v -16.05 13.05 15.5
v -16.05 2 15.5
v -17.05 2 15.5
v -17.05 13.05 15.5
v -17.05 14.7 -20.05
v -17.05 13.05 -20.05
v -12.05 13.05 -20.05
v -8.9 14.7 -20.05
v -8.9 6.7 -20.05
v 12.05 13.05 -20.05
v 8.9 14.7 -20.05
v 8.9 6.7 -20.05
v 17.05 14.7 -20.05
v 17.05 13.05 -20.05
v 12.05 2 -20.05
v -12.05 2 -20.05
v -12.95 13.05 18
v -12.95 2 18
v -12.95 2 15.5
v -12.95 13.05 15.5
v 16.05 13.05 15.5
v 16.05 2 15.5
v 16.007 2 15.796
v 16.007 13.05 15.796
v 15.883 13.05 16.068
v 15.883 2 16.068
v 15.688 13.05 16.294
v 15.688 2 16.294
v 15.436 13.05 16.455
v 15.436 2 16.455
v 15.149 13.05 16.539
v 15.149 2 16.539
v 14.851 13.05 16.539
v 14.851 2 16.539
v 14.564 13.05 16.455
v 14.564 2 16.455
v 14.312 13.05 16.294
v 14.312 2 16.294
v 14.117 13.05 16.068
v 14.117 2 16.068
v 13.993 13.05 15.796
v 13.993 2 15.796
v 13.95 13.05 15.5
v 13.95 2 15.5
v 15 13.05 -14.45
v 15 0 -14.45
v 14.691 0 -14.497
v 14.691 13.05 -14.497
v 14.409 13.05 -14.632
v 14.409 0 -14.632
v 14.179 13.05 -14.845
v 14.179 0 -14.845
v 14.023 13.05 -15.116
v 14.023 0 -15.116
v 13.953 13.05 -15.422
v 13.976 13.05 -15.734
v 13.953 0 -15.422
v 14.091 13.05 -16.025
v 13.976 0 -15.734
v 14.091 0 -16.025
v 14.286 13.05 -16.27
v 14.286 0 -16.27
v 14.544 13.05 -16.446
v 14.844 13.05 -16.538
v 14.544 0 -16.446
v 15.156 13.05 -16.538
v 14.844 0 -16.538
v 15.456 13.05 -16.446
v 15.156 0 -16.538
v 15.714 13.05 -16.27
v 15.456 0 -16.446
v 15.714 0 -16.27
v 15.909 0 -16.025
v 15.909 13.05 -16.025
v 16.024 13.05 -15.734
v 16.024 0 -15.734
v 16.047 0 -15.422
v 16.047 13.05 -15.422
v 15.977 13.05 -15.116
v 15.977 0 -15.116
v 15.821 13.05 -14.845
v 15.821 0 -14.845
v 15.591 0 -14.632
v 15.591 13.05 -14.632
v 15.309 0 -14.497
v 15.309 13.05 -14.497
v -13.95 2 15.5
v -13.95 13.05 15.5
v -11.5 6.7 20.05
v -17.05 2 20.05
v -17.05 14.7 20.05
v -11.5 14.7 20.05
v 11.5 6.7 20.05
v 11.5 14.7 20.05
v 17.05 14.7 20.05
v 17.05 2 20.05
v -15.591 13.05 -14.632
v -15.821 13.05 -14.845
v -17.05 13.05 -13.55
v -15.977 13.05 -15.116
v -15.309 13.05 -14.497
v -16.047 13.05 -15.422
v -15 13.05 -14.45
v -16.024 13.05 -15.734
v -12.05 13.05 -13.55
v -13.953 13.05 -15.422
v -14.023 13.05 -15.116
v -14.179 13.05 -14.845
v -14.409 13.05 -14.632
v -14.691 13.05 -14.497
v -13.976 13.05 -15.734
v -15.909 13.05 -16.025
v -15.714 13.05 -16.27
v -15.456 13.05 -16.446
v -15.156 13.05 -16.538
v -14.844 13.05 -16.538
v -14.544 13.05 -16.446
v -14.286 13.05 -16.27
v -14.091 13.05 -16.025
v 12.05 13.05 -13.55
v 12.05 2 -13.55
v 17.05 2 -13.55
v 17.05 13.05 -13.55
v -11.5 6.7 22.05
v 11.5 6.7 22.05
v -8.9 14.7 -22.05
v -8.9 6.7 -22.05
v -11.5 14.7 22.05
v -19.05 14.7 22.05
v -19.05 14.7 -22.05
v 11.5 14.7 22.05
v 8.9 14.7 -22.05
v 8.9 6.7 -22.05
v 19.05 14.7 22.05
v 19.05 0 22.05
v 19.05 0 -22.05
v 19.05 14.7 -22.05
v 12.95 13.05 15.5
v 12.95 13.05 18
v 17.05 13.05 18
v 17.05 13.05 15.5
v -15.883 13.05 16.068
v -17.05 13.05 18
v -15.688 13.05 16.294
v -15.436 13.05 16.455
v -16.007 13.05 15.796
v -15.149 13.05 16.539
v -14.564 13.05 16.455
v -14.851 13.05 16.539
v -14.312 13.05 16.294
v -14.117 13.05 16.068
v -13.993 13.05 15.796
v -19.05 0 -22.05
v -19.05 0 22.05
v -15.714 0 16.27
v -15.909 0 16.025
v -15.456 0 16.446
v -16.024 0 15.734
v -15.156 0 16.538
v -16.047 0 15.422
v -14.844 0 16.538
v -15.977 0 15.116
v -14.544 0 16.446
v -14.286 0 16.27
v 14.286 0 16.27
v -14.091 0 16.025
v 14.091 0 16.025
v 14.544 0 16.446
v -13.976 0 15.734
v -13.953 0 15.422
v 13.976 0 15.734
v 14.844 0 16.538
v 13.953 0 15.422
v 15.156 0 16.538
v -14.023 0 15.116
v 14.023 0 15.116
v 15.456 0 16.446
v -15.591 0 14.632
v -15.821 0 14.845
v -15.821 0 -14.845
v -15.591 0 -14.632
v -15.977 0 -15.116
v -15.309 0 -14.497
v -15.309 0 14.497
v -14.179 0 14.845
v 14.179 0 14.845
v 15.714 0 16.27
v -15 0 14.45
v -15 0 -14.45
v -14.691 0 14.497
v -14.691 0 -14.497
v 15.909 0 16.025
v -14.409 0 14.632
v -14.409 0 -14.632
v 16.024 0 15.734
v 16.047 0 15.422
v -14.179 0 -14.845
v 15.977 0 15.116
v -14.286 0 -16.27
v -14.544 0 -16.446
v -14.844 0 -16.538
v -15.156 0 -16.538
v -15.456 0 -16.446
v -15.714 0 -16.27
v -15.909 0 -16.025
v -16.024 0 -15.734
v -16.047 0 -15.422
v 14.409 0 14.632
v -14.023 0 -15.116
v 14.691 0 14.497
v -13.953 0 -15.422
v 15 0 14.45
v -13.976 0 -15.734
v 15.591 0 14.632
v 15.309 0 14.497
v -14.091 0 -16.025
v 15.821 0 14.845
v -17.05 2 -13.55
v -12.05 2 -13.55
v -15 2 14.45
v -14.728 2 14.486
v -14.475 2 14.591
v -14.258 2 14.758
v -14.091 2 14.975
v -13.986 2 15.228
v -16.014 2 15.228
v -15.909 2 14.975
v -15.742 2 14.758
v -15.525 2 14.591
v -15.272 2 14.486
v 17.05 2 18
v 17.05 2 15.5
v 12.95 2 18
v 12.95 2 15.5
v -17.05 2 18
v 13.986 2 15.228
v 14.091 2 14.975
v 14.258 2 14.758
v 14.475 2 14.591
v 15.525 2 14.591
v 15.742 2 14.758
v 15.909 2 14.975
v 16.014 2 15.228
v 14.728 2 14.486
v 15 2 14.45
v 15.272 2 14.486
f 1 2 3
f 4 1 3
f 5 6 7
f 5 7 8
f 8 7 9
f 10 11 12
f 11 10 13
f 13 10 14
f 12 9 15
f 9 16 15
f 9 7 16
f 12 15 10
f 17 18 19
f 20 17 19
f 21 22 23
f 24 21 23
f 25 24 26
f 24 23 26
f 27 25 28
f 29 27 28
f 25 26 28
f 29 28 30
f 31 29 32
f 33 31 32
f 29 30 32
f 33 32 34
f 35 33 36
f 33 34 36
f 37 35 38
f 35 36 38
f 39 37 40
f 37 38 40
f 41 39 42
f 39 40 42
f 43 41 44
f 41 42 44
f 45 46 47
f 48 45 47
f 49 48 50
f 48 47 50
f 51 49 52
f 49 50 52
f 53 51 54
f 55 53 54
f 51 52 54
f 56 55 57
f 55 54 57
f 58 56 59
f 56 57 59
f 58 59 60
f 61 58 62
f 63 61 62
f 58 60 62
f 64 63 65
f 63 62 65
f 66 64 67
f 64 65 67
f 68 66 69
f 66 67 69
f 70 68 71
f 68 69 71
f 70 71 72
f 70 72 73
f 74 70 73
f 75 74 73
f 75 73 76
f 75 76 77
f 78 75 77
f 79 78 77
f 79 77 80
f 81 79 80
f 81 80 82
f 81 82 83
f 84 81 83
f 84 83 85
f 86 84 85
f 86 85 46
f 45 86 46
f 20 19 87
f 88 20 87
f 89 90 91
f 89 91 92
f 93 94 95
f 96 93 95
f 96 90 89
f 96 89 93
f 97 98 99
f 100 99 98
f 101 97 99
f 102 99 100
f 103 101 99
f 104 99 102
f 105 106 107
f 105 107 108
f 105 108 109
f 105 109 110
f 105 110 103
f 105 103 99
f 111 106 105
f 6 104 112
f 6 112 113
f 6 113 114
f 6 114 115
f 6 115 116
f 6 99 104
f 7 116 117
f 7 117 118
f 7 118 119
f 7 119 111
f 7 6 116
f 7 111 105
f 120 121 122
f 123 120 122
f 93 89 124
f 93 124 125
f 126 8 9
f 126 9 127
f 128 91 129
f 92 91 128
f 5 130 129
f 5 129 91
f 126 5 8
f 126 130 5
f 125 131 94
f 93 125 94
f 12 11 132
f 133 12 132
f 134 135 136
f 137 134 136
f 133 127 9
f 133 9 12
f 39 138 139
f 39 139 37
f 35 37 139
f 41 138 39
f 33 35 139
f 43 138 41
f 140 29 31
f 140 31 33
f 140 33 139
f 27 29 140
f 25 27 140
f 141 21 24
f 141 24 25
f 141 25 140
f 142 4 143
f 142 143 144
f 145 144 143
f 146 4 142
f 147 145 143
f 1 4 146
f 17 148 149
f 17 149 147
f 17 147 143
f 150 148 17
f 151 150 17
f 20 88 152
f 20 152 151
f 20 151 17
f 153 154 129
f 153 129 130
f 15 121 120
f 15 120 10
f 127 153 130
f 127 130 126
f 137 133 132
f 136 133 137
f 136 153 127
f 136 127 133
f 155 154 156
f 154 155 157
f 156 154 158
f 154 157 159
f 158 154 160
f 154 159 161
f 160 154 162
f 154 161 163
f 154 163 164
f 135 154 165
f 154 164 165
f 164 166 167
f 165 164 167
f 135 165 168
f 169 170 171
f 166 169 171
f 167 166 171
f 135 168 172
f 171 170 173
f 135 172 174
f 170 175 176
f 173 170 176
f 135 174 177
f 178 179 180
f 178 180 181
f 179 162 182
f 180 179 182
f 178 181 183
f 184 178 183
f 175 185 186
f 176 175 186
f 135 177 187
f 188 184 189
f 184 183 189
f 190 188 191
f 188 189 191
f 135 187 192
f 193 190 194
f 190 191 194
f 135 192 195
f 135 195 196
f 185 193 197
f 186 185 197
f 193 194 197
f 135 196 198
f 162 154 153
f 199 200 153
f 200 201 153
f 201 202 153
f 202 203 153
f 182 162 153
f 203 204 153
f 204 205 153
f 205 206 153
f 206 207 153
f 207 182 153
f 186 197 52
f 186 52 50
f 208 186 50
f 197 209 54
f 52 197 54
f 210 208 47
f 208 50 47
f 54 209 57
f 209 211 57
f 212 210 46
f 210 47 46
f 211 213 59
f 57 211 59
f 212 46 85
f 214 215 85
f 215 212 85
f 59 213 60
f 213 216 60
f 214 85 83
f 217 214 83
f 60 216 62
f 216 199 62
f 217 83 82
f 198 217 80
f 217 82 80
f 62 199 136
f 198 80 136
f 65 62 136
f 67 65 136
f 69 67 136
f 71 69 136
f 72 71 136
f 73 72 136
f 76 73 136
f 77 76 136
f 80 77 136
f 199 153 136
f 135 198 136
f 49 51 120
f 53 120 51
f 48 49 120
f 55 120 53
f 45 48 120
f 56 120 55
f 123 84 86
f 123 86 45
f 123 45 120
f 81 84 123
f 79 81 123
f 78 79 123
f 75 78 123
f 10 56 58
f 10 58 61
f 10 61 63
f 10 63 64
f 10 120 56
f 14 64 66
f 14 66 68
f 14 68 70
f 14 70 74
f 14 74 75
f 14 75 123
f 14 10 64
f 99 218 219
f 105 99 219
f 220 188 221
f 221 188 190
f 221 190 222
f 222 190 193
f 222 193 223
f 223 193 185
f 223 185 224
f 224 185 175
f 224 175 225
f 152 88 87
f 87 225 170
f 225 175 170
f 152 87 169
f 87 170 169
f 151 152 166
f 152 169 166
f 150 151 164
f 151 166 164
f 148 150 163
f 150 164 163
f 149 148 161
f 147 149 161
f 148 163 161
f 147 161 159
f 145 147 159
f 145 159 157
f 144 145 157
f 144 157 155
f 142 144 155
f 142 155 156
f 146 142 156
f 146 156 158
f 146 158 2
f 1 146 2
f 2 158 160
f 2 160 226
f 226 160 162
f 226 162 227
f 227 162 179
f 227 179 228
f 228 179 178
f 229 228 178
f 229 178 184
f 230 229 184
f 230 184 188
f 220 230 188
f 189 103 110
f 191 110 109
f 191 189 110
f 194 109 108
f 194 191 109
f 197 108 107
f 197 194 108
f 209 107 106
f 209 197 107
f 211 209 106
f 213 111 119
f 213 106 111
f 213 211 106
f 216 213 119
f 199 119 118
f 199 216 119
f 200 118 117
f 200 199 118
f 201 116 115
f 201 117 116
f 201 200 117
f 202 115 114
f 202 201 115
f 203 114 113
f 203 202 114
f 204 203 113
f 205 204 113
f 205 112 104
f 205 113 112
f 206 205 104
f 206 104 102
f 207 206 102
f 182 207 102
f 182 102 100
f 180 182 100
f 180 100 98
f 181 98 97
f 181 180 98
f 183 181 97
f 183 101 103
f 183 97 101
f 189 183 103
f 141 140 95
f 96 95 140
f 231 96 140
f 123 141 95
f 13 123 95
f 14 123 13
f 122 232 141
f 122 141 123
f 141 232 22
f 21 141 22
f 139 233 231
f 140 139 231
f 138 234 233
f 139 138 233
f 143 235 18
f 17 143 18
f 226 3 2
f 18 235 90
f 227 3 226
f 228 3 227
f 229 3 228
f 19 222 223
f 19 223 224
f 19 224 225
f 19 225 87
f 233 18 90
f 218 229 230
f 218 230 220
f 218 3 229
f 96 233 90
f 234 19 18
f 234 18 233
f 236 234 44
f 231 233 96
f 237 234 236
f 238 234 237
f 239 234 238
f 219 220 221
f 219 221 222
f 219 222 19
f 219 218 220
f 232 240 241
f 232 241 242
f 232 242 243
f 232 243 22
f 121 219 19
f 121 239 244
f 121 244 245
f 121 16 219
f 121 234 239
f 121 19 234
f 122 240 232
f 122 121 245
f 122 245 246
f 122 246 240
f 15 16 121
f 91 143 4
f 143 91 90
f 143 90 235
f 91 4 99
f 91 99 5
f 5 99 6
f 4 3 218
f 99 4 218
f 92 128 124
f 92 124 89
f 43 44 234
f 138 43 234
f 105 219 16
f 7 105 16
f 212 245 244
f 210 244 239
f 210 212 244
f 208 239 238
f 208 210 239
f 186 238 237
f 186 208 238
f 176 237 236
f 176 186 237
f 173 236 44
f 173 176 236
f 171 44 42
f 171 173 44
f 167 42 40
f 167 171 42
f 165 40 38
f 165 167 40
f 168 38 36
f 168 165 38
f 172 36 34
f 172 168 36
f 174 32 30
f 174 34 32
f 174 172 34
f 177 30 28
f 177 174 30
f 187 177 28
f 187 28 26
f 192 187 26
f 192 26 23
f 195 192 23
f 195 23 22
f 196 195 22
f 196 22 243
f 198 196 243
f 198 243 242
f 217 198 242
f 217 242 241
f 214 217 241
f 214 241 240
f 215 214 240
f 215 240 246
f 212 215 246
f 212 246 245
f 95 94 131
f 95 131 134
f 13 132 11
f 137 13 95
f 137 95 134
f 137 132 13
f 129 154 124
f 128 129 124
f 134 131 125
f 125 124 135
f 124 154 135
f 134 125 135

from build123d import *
from build123d.topology import SkipClean

# Parameters (mm, degrees)
BOSS_EXTRUDE1_DEPTH                        = 2
BOSS_EXTRUDE2_DEPTH                        = 12.7
BOSS_EXTRUDE2_DEPTH_BACK                   = 2
SKETCH2_W                                  = 38.1
SKETCH2_H                                  = 44.1
SKETCH2_W_2                                = 34.1
SKETCH2_H_2                                = 40.1
SKETCH4_W                                  = 17.8
SKETCH4_H                                  = 2
SKETCH4_W_2                                = 23
CUT_EXTRUDE1_DEPTH                         = 8
SKETCH5_W                                  = 5
SKETCH5_H                                  = 6.5
BOSS_EXTRUDE3_DEPTH                        = 11.05
SKETCH3_R                                  = 1.05
CUT_EXTRUDE2_DEPTH                         = 33.637325258
MIRROR1_AT_THE_SECOND_PLANE_COPY_1_SKETC_R = 1.05
MIRROR1_AT_THE_SECOND_PLANE_COPY_1_DEPTH   = 33.637325258


with BuildPart() as part:
    # Sketch1 → Boss-Extrude1 (new body)
    with BuildSketch(Plane(origin=(0, 0, 0), x_dir=(1, 0, 0), z_dir=(0, 1, 0))):
        Polygon((-17.05, 20.05), (-17.05, -20.05), (17.05, -20.05), align=None)
        Polygon((17.05, 20.05), (17.05, -20.05), (-17.05, 20.05), align=None)
    extrude(amount=BOSS_EXTRUDE1_DEPTH)

    # Sketch2 → Boss-Extrude2 (add, two sides: drawn at the far end of the back side and taken through both)
    with BuildSketch(Plane(origin=(0, 2, 0), x_dir=(1, 0, 0), z_dir=(0, 1, 0)).offset(-BOSS_EXTRUDE2_DEPTH_BACK)):
        Rectangle(SKETCH2_W, SKETCH2_H)
        Rectangle(SKETCH2_W_2, SKETCH2_H_2, mode=Mode.SUBTRACT)
    extrude(amount=BOSS_EXTRUDE2_DEPTH + BOSS_EXTRUDE2_DEPTH_BACK)

    # Sketch4 → Cut-Extrude1 (cut)
    with BuildSketch(Plane(origin=(0, 14.7, 0), x_dir=(1, 0, 0), z_dir=(0, 1, 0))):
        with Locations((0, 21.05)):
            Rectangle(SKETCH4_W, SKETCH4_H)
        with Locations((0, -21.05)):
            Rectangle(SKETCH4_W_2, SKETCH4_H)
    extrude(amount=-CUT_EXTRUDE1_DEPTH, mode=Mode.SUBTRACT)

    # Sketch5 → Boss-Extrude3 (add)
    with BuildSketch(Plane(origin=(0, 2, 0), x_dir=(1, 0, 0), z_dir=(0, 1, 0))):
        with BuildLine():
            ThreePointArc((-13.95, -15.5), (-15, -16.55), (-16.05, -15.5))
            Line((-16.05, -15.5), (-17.05, -15.5))
            Line((-17.05, -15.5), (-17.05, -18))
            Line((-17.05, -18), (-12.95, -18))
            Line((-12.95, -18), (-12.95, -15.5))
            Line((-12.95, -15.5), (-13.95, -15.5))
        make_face()
        with Locations((-14.55, 16.8)):
            Rectangle(SKETCH5_W, SKETCH5_H)
        with Locations((14.55, 16.8)):
            Rectangle(SKETCH5_W, SKETCH5_H)
        with BuildLine():
            Line((13.95, -15.5), (12.95, -15.5))
            Line((12.95, -15.5), (12.95, -18))
            Line((12.95, -18), (17.05, -18))
            Line((17.05, -18), (17.05, -15.5))
            Line((17.05, -15.5), (16.05, -15.5))
            ThreePointArc((16.05, -15.5), (15, -16.55), (13.95, -15.5))
        make_face()
    extrude(amount=BOSS_EXTRUDE3_DEPTH)

    # Sketch3 → Cut-Extrude2 (cut, through all)
    with BuildSketch(Plane.XZ):
        with Locations(Location((-15, 15.5, 0), (0, 0, 270))):
            Circle(SKETCH3_R)
    cut_extrude2 = extrude(amount=-CUT_EXTRUDE2_DEPTH, mode=Mode.SUBTRACT)

    # Mirror1: Cut-Extrude2 across plane
    add(cut_extrude2.mirror(Plane.XY), mode=Mode.SUBTRACT)

    # Mirror1 at the second plane: Cut-Extrude2 across plane
    with SkipClean():  # the faces are left unmerged after this step: merging them gives an invalid solid
        add(cut_extrude2.mirror(Plane(origin=(0, 0, 0), x_dir=(0, 0, 1), z_dir=(1, 0, 0))), mode=Mode.SUBTRACT)

    # Mirror1 at the second plane copy 1 sketc → Mirror1 at the second plane copy 1 (cut, through all)
    with SkipClean():  # the faces are left unmerged after this step: merging them gives an invalid solid
        with BuildSketch(Plane(origin=(0, 0, 0), x_dir=(-1, 0, 0), z_dir=(0, -1, 0))):
            with Locations(Location((-15, 15.5, 0), (0, 0, 270))):
                Circle(MIRROR1_AT_THE_SECOND_PLANE_COPY_1_SKETC_R)
        extrude(amount=-MIRROR1_AT_THE_SECOND_PLANE_COPY_1_DEPTH, mode=Mode.SUBTRACT)


solid = part.part
